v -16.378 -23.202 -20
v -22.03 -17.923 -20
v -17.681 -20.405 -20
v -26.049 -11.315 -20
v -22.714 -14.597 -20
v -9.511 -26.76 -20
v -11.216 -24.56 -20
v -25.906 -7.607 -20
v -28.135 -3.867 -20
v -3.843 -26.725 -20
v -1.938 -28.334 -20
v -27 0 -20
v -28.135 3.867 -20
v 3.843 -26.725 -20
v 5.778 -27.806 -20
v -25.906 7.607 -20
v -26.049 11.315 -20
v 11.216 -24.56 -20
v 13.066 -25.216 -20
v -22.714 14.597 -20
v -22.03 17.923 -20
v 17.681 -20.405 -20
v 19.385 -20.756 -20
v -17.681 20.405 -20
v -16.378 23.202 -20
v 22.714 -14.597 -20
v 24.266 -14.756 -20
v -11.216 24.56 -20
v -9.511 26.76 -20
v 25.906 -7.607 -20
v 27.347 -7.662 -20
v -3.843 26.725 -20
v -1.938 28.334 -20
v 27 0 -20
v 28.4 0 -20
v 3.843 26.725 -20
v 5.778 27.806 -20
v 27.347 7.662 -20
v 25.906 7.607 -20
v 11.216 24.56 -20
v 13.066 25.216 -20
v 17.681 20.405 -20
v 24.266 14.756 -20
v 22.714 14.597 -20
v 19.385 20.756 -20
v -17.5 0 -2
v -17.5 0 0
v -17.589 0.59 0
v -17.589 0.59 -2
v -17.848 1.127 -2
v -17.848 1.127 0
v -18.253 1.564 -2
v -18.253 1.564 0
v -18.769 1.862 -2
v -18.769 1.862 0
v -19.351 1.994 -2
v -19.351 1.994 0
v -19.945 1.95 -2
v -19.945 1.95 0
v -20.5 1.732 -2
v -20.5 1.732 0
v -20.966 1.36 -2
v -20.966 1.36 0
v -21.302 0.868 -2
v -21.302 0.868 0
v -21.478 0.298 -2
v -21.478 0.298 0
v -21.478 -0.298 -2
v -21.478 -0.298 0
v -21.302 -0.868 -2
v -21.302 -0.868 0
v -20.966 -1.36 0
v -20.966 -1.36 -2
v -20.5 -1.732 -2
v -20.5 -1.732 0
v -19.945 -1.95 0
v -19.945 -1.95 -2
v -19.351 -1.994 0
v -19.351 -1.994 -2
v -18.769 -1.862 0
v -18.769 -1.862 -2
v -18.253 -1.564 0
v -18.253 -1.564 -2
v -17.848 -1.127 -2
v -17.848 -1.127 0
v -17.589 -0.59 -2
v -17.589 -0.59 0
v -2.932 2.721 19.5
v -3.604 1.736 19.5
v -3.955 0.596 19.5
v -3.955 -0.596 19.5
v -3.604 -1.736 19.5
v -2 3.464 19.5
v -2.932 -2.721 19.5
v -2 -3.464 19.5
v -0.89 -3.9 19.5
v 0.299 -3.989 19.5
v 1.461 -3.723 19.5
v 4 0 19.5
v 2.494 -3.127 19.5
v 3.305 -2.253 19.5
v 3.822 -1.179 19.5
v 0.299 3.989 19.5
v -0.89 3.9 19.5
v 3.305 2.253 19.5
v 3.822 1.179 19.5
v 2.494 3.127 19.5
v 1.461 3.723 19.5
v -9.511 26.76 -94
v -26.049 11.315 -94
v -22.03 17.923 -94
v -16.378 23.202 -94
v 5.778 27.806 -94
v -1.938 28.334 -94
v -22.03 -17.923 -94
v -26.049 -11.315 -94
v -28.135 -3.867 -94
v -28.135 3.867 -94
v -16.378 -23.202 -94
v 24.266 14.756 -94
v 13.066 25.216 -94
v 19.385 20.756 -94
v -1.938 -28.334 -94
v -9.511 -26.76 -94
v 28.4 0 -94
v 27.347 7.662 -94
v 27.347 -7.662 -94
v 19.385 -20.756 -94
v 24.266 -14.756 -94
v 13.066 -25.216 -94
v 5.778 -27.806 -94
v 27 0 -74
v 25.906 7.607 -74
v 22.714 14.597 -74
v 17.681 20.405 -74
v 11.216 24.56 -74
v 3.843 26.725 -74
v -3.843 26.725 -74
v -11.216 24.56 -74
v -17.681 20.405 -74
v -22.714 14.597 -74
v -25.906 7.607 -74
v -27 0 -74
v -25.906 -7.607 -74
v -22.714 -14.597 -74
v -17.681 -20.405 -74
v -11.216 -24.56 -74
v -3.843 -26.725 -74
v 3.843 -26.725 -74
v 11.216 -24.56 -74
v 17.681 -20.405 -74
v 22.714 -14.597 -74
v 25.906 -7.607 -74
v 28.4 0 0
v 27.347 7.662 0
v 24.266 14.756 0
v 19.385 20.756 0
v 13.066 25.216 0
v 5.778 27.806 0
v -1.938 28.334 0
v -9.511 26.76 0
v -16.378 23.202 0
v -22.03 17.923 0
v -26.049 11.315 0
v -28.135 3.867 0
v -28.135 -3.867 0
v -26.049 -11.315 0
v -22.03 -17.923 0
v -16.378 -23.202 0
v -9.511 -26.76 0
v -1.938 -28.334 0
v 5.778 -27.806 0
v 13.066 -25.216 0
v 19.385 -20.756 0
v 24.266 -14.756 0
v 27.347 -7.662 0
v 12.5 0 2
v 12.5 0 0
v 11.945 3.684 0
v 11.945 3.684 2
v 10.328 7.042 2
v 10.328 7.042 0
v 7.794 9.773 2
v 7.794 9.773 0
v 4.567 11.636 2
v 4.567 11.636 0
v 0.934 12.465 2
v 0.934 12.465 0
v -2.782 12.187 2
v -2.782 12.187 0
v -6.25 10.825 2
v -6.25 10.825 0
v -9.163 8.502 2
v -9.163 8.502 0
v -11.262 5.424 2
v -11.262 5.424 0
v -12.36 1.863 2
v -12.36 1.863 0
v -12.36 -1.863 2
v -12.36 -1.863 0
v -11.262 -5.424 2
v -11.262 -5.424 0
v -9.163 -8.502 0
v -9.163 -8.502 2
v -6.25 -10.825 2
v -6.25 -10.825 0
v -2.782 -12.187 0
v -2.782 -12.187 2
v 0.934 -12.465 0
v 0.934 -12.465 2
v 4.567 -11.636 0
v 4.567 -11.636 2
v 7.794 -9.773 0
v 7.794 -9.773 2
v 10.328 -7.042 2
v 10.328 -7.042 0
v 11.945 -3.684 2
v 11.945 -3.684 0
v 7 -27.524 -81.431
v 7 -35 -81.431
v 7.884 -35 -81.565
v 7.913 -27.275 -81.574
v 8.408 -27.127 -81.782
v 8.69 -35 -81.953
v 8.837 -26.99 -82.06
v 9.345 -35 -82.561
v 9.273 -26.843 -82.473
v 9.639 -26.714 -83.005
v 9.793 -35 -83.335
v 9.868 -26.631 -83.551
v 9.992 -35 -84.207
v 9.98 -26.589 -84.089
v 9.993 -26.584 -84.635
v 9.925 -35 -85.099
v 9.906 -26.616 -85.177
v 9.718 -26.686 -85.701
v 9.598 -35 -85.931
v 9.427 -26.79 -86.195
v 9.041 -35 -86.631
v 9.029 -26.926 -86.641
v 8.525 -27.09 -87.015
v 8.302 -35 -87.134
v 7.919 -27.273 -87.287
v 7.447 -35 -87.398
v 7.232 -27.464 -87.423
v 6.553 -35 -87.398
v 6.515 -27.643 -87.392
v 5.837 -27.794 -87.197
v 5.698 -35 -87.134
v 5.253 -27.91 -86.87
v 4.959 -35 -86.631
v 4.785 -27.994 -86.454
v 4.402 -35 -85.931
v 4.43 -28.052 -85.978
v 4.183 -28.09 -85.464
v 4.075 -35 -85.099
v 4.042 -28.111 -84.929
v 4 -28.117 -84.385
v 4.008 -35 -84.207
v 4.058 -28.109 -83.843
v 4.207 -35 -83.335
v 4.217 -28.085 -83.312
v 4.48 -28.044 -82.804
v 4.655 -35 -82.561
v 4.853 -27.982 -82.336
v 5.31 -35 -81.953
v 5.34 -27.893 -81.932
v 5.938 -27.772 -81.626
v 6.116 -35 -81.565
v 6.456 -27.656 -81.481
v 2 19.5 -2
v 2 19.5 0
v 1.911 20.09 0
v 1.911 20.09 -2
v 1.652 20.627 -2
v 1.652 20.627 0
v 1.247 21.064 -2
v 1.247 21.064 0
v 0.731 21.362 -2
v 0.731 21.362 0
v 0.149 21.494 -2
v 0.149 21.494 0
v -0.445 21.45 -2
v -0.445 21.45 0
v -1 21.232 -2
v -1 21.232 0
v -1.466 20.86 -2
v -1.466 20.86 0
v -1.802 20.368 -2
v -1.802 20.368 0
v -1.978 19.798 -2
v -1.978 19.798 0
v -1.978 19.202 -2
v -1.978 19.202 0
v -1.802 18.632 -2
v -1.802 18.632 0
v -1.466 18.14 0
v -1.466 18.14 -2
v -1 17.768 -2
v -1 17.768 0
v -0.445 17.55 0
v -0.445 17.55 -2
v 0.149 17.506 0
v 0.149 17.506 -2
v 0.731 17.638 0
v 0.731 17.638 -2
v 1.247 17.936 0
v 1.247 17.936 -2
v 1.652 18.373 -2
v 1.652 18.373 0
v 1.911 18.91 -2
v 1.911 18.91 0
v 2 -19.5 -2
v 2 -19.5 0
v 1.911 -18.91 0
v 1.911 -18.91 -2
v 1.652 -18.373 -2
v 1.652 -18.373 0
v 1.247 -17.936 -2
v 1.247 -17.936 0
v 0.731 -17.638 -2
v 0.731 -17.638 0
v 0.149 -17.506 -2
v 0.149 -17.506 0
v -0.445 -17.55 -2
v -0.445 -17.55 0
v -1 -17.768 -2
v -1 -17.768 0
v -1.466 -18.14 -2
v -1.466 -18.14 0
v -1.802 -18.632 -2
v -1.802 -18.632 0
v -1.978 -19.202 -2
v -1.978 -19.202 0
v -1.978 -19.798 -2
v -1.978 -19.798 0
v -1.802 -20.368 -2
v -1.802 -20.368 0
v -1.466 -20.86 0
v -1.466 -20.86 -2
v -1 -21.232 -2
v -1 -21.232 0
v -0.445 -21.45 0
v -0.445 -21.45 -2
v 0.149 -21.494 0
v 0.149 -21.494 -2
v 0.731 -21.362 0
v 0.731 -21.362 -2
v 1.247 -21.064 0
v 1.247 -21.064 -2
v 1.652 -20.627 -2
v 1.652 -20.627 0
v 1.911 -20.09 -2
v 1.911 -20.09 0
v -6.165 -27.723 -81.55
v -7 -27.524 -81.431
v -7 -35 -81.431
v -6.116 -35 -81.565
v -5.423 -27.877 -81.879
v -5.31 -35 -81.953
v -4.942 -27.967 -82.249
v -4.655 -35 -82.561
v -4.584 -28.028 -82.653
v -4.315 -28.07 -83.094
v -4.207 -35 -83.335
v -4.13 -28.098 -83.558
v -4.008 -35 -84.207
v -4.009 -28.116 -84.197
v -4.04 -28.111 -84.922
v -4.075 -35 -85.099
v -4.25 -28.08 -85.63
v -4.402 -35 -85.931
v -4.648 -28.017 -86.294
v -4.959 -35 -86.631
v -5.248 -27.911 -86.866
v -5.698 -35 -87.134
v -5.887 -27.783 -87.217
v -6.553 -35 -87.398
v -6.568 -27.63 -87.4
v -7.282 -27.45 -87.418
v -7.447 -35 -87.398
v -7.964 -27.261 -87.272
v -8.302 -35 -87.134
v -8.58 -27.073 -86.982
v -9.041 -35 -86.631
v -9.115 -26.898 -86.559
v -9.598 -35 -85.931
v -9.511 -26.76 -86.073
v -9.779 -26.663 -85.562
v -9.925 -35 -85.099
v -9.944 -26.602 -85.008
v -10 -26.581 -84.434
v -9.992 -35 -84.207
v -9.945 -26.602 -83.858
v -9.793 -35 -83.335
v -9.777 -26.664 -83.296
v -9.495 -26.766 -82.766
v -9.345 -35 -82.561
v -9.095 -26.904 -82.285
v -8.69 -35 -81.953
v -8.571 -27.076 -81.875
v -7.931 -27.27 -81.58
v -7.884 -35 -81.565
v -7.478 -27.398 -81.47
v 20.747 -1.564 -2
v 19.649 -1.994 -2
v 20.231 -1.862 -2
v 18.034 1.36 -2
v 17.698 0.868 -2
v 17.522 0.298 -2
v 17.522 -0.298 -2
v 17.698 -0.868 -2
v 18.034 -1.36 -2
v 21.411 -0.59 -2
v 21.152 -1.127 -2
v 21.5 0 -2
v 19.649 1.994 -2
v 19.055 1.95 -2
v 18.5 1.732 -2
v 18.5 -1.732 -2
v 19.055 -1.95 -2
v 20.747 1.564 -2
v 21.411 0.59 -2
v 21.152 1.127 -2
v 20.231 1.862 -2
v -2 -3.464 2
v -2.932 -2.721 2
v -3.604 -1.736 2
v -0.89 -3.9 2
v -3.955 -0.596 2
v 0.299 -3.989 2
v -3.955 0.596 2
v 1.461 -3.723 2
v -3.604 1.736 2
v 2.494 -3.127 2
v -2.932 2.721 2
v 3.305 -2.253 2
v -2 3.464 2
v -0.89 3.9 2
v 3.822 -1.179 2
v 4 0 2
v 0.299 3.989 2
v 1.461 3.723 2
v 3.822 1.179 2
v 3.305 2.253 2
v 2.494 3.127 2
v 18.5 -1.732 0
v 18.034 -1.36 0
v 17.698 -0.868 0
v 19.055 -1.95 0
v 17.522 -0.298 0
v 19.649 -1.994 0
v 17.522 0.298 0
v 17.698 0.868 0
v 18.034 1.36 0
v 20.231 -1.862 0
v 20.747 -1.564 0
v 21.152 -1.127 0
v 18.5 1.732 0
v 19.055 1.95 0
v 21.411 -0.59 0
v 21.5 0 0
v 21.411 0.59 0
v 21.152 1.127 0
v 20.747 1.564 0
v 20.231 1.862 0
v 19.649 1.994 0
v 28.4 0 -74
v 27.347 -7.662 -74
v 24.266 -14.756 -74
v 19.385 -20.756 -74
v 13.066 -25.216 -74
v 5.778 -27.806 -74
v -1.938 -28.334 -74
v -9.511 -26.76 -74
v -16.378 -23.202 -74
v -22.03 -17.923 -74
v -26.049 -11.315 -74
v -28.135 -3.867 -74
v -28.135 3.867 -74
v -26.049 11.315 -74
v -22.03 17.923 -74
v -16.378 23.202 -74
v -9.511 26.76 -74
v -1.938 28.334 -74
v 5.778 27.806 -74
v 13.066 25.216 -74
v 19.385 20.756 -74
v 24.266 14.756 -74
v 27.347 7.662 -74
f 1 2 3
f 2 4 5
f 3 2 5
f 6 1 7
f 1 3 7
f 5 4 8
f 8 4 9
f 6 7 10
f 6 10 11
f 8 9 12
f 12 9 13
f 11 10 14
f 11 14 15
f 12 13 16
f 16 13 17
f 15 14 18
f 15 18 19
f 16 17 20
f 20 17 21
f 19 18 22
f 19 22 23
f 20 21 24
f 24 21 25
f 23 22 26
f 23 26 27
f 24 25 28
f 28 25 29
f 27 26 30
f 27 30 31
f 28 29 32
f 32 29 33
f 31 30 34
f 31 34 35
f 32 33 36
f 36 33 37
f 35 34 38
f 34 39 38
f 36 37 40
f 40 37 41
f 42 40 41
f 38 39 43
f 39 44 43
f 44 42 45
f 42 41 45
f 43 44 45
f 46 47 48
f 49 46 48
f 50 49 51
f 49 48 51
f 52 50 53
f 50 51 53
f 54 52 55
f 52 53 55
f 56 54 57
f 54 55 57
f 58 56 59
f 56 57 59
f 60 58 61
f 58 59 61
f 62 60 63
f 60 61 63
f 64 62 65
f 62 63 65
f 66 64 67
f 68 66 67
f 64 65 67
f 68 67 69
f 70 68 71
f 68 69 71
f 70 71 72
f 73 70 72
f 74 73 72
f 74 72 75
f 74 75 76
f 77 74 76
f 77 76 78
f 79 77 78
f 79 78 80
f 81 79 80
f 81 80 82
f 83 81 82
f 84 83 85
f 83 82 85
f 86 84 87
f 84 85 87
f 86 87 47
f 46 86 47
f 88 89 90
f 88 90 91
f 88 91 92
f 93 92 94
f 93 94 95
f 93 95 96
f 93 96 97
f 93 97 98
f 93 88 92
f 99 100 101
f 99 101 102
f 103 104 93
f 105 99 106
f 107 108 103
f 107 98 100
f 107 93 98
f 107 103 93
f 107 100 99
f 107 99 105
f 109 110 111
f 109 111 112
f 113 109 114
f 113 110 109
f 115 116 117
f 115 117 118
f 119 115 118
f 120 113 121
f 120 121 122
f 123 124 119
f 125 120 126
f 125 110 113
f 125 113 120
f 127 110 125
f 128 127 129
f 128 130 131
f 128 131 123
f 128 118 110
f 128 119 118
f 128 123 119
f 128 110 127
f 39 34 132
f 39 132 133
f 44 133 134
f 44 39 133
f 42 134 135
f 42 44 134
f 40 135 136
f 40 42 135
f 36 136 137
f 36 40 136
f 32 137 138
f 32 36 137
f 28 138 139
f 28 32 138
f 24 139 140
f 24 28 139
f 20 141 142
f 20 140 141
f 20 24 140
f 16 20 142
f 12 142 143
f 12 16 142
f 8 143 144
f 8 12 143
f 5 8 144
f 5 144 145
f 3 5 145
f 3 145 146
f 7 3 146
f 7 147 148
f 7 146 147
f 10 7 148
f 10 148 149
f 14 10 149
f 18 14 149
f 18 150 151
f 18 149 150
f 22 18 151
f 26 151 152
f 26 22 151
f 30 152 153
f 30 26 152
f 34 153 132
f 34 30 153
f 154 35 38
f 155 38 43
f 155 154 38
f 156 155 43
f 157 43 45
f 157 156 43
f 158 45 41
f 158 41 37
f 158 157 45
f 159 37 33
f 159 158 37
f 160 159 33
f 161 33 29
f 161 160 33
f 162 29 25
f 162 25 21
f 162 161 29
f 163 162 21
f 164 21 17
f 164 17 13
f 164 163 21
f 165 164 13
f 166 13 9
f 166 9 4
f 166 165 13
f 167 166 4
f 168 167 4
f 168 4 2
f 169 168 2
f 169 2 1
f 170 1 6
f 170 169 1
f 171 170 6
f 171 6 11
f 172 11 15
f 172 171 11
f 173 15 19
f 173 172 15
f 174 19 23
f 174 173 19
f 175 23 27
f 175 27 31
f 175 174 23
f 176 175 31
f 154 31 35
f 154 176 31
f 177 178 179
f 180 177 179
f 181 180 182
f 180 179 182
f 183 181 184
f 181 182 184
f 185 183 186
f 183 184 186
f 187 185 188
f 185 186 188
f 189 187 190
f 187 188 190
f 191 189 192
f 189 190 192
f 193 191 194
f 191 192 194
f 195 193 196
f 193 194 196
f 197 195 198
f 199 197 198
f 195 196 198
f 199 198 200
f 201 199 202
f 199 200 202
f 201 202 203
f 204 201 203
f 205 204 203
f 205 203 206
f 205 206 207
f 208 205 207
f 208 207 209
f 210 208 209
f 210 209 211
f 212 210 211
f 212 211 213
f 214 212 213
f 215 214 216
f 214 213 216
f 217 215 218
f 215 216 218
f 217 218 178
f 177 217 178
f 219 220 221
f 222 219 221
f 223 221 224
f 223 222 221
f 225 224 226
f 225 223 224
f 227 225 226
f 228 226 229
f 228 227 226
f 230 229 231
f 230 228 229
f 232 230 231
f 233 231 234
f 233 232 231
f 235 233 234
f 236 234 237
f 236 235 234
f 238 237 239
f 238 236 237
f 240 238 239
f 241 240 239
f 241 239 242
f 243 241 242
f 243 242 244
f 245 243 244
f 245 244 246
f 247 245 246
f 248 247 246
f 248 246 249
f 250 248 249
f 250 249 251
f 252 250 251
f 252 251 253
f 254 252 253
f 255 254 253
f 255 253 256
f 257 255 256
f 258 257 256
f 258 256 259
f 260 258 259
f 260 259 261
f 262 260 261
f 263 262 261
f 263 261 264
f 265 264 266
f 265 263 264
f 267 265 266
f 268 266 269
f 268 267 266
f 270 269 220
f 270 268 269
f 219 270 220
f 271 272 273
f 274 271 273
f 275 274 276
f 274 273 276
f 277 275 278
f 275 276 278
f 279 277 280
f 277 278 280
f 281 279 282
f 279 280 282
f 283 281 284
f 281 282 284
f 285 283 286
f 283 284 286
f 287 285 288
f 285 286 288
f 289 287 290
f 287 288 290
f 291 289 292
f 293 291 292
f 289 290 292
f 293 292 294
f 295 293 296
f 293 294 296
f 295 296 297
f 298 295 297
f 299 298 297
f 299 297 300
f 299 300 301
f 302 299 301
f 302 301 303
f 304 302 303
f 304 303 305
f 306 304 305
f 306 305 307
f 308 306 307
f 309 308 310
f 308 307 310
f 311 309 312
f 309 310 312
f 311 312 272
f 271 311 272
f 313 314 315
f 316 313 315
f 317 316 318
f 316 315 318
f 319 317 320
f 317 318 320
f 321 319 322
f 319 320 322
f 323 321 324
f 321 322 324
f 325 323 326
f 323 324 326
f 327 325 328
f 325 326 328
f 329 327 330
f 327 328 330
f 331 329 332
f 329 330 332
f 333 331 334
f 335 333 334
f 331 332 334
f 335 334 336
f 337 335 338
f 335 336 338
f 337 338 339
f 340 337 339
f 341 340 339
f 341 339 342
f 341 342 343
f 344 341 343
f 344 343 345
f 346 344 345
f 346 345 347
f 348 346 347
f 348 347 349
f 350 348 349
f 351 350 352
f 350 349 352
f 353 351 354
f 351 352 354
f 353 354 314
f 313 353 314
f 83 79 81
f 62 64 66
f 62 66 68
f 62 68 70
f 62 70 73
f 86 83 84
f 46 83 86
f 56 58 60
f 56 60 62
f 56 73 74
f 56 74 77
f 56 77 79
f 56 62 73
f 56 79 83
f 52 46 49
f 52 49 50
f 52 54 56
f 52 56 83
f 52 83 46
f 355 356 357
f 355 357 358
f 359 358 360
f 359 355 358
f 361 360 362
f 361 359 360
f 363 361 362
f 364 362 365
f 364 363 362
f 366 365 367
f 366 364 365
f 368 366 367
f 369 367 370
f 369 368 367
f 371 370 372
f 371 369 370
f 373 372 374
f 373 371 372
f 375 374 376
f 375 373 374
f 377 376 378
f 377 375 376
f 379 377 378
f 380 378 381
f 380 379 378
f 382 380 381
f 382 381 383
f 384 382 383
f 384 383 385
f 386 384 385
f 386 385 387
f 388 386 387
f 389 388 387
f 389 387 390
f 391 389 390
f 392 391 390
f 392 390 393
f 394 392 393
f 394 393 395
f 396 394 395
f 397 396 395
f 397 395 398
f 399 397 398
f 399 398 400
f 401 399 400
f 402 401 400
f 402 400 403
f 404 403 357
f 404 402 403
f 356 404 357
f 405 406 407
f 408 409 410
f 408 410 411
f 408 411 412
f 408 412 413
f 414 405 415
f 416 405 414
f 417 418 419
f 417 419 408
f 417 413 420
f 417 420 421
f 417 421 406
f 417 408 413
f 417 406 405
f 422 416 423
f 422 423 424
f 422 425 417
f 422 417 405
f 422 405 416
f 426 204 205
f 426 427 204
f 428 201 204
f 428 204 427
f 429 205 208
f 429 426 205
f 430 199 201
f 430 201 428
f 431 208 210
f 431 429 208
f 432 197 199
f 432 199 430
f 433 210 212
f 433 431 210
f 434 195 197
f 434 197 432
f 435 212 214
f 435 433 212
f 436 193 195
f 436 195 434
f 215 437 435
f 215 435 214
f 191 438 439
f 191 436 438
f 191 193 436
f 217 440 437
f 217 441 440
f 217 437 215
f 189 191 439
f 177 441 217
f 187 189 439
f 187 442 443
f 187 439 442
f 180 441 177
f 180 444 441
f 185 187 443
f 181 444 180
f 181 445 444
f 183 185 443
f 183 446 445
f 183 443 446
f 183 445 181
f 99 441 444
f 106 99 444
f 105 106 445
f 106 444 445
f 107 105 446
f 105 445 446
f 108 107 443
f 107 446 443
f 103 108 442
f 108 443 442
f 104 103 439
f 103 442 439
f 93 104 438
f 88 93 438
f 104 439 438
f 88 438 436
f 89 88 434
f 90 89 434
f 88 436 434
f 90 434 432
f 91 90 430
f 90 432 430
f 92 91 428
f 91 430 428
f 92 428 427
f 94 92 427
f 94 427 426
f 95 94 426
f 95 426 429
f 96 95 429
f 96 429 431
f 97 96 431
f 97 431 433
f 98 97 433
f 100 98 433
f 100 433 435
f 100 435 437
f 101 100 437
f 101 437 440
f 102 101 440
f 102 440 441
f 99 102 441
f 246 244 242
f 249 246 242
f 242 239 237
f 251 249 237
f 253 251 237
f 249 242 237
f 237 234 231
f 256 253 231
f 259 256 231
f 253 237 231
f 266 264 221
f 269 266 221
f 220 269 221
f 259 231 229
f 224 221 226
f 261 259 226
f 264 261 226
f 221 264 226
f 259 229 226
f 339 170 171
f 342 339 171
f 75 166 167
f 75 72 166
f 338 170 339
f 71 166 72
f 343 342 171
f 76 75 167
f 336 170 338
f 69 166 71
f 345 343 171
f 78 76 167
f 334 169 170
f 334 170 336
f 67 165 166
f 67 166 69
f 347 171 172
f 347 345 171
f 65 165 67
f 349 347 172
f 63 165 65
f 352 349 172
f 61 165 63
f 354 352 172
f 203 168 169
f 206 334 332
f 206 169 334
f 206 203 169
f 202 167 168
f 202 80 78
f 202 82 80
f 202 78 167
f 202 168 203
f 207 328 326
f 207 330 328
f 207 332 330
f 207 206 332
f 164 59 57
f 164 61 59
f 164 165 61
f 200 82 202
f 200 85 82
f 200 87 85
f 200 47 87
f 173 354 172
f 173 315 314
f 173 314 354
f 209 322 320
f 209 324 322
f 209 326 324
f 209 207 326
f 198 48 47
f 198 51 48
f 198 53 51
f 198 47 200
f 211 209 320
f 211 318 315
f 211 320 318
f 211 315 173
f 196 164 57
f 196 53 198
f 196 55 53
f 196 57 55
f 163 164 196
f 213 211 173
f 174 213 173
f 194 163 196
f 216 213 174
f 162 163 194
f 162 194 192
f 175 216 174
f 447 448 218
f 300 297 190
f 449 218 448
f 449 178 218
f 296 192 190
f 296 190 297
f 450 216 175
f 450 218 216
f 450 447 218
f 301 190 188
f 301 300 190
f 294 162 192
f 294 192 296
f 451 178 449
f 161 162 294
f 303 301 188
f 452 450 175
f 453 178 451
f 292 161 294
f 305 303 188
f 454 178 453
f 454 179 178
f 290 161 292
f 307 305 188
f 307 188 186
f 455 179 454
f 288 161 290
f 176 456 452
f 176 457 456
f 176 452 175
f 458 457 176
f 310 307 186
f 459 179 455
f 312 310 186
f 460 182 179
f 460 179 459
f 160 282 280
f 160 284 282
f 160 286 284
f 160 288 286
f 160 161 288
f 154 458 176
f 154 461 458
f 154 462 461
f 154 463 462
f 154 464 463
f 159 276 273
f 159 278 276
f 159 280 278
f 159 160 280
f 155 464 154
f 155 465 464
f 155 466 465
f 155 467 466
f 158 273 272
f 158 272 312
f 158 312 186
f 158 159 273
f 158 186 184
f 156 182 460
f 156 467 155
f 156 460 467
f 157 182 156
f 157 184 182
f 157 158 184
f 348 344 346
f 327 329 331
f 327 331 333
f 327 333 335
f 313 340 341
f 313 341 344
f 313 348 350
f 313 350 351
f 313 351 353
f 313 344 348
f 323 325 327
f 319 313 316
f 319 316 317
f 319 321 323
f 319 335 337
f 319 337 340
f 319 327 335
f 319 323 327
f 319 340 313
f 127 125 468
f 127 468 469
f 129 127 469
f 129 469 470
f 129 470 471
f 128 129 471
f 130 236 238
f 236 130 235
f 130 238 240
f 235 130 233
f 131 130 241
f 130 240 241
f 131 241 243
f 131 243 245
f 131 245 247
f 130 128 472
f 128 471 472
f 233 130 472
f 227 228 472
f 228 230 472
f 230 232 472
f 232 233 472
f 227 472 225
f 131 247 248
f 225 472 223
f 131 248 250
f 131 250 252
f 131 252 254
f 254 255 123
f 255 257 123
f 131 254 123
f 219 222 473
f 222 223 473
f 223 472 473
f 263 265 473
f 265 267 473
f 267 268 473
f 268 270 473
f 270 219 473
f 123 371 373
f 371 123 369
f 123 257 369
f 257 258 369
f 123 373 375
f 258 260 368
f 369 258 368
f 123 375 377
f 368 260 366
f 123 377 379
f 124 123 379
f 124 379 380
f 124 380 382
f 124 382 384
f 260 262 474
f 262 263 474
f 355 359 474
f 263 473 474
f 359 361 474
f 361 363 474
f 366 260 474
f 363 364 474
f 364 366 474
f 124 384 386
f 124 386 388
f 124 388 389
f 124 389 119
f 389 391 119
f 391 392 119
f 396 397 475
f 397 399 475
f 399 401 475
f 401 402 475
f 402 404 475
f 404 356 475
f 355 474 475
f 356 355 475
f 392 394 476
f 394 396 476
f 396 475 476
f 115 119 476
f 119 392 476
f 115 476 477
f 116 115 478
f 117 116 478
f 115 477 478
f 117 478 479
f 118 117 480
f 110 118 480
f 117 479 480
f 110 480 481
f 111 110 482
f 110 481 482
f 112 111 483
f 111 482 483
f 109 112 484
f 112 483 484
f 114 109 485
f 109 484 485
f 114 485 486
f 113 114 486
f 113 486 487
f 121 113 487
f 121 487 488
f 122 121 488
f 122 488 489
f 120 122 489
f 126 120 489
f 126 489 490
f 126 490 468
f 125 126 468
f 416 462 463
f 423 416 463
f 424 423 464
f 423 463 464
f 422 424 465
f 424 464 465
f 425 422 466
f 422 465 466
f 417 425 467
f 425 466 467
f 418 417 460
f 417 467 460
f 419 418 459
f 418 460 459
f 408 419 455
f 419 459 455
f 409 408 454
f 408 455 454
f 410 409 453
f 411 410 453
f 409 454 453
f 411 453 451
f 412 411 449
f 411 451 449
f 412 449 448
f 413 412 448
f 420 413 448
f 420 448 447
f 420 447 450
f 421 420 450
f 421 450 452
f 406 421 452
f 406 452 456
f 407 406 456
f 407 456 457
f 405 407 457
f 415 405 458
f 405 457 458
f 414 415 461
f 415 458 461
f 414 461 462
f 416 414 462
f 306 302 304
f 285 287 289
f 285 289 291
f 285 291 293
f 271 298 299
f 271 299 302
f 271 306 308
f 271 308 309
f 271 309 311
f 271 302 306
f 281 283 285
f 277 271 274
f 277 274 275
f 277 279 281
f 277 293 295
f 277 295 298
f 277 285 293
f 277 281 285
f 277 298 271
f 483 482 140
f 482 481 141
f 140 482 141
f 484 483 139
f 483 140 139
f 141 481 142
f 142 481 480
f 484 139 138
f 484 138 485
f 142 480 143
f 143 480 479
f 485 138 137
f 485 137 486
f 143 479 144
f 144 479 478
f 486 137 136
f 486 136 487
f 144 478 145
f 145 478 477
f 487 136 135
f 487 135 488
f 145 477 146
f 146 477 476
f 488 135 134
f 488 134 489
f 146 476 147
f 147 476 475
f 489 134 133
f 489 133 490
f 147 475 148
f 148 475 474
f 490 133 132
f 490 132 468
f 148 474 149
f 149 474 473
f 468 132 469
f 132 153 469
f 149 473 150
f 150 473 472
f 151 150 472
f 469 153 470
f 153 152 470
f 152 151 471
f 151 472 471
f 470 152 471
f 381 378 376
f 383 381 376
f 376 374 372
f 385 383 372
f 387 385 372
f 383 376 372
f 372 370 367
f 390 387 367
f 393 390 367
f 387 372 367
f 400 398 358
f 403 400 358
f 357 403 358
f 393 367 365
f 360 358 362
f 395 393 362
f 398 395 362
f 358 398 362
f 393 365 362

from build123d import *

# Parameters (mm, degrees)
SKETCH_1_R          = 27
EXTRUDE_1_DEPTH     = 94
SKETCH_2_R          = 28.4
SKETCH_2_R_2        = 27
EXTRUDE_2_DEPTH     = 20
EXTRUDE_START       = -20
SKETCH_3_R          = 28.4
SKETCH_3_R_2        = 27
EXTRUDE_3_DEPTH     = 20
SKETCH_5_R          = 3
EXTRUDE_4_DEPTH     = 15
SKETCH_9_R          = 4
EXTRUDE_6_DEPTH     = 19.5
SKETCH_10_R         = 12.5
SKETCH_10_R_2       = 4
EXTRUDE_7_DEPTH     = 2
SKETCH_11_R         = 2
CUT_EXTRUDE_2_DEPTH = 2


with BuildPart() as part:
    # 草图1 → 凸台-拉伸1 (new body)
    with BuildSketch(Plane.XY):
        Circle(SKETCH_1_R)
    extrude(amount=-EXTRUDE_1_DEPTH)

    # 草图2 → 凸台-拉伸2 (add)
    with BuildSketch(Plane.XY):
        Circle(SKETCH_2_R)
        Circle(SKETCH_2_R_2, mode=Mode.SUBTRACT)
    extrude(amount=-EXTRUDE_2_DEPTH)

    # 草图3 → 凸台-拉伸3 (add)
    with BuildSketch(Plane(origin=(0, 0, -94), x_dir=(-1, 0, 0), z_dir=(0, 0, -1)).offset(EXTRUDE_START)):
        with Locations(Location((0, 0, 0), (0, 0, 180))):
            Circle(SKETCH_3_R)
        with Locations(Location((0, 0, 0), (0, 0, 180))):
            Circle(SKETCH_3_R_2, mode=Mode.SUBTRACT)
    extrude(amount=EXTRUDE_3_DEPTH)

    # 草图5 → 凸台-拉伸4 (add)
    with BuildSketch(Plane(origin=(0, -20, 0), x_dir=(1, 0, 0), z_dir=(0, 1, 0))):
        with Locations(Location((-7, 84.431486428, 0), (0, 0, 270))):
            Circle(SKETCH_5_R)
        with Locations(Location((7, 84.431486428, 0), (0, 0, 270))):
            Circle(SKETCH_5_R)
    extrude(amount=-EXTRUDE_4_DEPTH)

    # 草图9 → 凸台-拉伸6 (add)
    with BuildSketch(Plane.XY):
        Circle(SKETCH_9_R)
    extrude(amount=EXTRUDE_6_DEPTH)

    # 草图10 → 凸台-拉伸7 (add)
    with BuildSketch(Plane.XY):
        Circle(SKETCH_10_R)
        Circle(SKETCH_10_R_2, mode=Mode.SUBTRACT)
    extrude(amount=EXTRUDE_7_DEPTH)

    # 草图11 → 切除-拉伸2 (cut)
    with BuildSketch(Plane.XY):
        with Locations((19.5, 0)):
            Circle(SKETCH_11_R)
        with Locations((0, 19.5)):
            Circle(SKETCH_11_R)
        with Locations((-19.5, 0)):
            Circle(SKETCH_11_R)
        with Locations((0, -19.5)):
            Circle(SKETCH_11_R)
    extrude(amount=-CUT_EXTRUDE_2_DEPTH, mode=Mode.SUBTRACT)


solid = part.part
